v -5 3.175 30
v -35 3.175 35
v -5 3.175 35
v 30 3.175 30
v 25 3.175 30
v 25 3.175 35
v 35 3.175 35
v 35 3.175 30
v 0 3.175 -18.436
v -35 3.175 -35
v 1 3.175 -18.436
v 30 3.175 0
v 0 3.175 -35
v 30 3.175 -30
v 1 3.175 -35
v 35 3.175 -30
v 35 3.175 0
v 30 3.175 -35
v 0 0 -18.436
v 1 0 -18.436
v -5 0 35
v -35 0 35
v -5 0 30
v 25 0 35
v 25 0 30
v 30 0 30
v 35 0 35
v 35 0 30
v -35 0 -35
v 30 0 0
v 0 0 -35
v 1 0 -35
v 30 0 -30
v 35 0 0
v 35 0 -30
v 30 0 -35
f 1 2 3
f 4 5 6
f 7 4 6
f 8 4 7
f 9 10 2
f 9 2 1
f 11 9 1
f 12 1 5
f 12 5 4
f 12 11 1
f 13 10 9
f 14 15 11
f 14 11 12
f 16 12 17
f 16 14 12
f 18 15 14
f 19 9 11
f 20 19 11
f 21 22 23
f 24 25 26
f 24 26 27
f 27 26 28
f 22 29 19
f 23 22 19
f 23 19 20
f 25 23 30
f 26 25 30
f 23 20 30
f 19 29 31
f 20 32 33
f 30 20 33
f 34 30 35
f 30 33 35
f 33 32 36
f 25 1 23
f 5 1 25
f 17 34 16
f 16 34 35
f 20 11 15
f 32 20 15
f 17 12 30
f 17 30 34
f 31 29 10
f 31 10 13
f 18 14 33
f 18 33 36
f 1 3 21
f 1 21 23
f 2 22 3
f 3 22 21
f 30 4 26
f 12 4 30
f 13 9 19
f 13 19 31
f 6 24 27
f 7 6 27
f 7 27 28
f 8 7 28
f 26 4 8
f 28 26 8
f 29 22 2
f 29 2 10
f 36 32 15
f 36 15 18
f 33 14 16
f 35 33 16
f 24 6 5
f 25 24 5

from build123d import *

# Parameters (mm, degrees)
SKETCH1_W           = 70
SKETCH1_H           = 70
BOSS_EXTRUDE1_DEPTH = 3.175
SKETCH2_W           = 1
SKETCH2_H           = 16.56370183
CUT_EXTRUDE1_DEPTH  = 3.175
SKETCH3_W           = 30
SKETCH3_H           = 5
SKETCH3_W_2         = 5
SKETCH3_H_2         = 30
CUT_EXTRUDE2_DEPTH  = 10


with BuildPart() as part:
    # Sketch1 → Boss-Extrude1 (new body)
    with BuildSketch(Plane(origin=(0, 0, 0), x_dir=(1, 0, 0), z_dir=(0, 1, 0))):
        Rectangle(SKETCH1_W, SKETCH1_H)
    extrude(amount=BOSS_EXTRUDE1_DEPTH)

    # Sketch2 → Cut-Extrude1 (cut)
    with BuildSketch(Plane(origin=(0, 3.175, 0), x_dir=(1, 0, 0), z_dir=(0, 1, 0))):
        with Locations((0.5, 26.718149085)):
            Rectangle(SKETCH2_W, SKETCH2_H)
    extrude(amount=-CUT_EXTRUDE1_DEPTH, mode=Mode.SUBTRACT)

    # Sketch3 → Cut-Extrude2 (cut)
    with BuildSketch(Plane(origin=(0, 3.175, 0), x_dir=(1, 0, 0), z_dir=(0, 1, 0))):
        with Locations((10, -32.5)):
            Rectangle(SKETCH3_W, SKETCH3_H)
        with Locations((32.5, -15)):
            Rectangle(SKETCH3_W_2, SKETCH3_H_2)
        with Locations((32.5, 32.5)):
            Rectangle(SKETCH3_W_2, SKETCH3_H)
    extrude(amount=-CUT_EXTRUDE2_DEPTH, mode=Mode.SUBTRACT)


solid = part.part
